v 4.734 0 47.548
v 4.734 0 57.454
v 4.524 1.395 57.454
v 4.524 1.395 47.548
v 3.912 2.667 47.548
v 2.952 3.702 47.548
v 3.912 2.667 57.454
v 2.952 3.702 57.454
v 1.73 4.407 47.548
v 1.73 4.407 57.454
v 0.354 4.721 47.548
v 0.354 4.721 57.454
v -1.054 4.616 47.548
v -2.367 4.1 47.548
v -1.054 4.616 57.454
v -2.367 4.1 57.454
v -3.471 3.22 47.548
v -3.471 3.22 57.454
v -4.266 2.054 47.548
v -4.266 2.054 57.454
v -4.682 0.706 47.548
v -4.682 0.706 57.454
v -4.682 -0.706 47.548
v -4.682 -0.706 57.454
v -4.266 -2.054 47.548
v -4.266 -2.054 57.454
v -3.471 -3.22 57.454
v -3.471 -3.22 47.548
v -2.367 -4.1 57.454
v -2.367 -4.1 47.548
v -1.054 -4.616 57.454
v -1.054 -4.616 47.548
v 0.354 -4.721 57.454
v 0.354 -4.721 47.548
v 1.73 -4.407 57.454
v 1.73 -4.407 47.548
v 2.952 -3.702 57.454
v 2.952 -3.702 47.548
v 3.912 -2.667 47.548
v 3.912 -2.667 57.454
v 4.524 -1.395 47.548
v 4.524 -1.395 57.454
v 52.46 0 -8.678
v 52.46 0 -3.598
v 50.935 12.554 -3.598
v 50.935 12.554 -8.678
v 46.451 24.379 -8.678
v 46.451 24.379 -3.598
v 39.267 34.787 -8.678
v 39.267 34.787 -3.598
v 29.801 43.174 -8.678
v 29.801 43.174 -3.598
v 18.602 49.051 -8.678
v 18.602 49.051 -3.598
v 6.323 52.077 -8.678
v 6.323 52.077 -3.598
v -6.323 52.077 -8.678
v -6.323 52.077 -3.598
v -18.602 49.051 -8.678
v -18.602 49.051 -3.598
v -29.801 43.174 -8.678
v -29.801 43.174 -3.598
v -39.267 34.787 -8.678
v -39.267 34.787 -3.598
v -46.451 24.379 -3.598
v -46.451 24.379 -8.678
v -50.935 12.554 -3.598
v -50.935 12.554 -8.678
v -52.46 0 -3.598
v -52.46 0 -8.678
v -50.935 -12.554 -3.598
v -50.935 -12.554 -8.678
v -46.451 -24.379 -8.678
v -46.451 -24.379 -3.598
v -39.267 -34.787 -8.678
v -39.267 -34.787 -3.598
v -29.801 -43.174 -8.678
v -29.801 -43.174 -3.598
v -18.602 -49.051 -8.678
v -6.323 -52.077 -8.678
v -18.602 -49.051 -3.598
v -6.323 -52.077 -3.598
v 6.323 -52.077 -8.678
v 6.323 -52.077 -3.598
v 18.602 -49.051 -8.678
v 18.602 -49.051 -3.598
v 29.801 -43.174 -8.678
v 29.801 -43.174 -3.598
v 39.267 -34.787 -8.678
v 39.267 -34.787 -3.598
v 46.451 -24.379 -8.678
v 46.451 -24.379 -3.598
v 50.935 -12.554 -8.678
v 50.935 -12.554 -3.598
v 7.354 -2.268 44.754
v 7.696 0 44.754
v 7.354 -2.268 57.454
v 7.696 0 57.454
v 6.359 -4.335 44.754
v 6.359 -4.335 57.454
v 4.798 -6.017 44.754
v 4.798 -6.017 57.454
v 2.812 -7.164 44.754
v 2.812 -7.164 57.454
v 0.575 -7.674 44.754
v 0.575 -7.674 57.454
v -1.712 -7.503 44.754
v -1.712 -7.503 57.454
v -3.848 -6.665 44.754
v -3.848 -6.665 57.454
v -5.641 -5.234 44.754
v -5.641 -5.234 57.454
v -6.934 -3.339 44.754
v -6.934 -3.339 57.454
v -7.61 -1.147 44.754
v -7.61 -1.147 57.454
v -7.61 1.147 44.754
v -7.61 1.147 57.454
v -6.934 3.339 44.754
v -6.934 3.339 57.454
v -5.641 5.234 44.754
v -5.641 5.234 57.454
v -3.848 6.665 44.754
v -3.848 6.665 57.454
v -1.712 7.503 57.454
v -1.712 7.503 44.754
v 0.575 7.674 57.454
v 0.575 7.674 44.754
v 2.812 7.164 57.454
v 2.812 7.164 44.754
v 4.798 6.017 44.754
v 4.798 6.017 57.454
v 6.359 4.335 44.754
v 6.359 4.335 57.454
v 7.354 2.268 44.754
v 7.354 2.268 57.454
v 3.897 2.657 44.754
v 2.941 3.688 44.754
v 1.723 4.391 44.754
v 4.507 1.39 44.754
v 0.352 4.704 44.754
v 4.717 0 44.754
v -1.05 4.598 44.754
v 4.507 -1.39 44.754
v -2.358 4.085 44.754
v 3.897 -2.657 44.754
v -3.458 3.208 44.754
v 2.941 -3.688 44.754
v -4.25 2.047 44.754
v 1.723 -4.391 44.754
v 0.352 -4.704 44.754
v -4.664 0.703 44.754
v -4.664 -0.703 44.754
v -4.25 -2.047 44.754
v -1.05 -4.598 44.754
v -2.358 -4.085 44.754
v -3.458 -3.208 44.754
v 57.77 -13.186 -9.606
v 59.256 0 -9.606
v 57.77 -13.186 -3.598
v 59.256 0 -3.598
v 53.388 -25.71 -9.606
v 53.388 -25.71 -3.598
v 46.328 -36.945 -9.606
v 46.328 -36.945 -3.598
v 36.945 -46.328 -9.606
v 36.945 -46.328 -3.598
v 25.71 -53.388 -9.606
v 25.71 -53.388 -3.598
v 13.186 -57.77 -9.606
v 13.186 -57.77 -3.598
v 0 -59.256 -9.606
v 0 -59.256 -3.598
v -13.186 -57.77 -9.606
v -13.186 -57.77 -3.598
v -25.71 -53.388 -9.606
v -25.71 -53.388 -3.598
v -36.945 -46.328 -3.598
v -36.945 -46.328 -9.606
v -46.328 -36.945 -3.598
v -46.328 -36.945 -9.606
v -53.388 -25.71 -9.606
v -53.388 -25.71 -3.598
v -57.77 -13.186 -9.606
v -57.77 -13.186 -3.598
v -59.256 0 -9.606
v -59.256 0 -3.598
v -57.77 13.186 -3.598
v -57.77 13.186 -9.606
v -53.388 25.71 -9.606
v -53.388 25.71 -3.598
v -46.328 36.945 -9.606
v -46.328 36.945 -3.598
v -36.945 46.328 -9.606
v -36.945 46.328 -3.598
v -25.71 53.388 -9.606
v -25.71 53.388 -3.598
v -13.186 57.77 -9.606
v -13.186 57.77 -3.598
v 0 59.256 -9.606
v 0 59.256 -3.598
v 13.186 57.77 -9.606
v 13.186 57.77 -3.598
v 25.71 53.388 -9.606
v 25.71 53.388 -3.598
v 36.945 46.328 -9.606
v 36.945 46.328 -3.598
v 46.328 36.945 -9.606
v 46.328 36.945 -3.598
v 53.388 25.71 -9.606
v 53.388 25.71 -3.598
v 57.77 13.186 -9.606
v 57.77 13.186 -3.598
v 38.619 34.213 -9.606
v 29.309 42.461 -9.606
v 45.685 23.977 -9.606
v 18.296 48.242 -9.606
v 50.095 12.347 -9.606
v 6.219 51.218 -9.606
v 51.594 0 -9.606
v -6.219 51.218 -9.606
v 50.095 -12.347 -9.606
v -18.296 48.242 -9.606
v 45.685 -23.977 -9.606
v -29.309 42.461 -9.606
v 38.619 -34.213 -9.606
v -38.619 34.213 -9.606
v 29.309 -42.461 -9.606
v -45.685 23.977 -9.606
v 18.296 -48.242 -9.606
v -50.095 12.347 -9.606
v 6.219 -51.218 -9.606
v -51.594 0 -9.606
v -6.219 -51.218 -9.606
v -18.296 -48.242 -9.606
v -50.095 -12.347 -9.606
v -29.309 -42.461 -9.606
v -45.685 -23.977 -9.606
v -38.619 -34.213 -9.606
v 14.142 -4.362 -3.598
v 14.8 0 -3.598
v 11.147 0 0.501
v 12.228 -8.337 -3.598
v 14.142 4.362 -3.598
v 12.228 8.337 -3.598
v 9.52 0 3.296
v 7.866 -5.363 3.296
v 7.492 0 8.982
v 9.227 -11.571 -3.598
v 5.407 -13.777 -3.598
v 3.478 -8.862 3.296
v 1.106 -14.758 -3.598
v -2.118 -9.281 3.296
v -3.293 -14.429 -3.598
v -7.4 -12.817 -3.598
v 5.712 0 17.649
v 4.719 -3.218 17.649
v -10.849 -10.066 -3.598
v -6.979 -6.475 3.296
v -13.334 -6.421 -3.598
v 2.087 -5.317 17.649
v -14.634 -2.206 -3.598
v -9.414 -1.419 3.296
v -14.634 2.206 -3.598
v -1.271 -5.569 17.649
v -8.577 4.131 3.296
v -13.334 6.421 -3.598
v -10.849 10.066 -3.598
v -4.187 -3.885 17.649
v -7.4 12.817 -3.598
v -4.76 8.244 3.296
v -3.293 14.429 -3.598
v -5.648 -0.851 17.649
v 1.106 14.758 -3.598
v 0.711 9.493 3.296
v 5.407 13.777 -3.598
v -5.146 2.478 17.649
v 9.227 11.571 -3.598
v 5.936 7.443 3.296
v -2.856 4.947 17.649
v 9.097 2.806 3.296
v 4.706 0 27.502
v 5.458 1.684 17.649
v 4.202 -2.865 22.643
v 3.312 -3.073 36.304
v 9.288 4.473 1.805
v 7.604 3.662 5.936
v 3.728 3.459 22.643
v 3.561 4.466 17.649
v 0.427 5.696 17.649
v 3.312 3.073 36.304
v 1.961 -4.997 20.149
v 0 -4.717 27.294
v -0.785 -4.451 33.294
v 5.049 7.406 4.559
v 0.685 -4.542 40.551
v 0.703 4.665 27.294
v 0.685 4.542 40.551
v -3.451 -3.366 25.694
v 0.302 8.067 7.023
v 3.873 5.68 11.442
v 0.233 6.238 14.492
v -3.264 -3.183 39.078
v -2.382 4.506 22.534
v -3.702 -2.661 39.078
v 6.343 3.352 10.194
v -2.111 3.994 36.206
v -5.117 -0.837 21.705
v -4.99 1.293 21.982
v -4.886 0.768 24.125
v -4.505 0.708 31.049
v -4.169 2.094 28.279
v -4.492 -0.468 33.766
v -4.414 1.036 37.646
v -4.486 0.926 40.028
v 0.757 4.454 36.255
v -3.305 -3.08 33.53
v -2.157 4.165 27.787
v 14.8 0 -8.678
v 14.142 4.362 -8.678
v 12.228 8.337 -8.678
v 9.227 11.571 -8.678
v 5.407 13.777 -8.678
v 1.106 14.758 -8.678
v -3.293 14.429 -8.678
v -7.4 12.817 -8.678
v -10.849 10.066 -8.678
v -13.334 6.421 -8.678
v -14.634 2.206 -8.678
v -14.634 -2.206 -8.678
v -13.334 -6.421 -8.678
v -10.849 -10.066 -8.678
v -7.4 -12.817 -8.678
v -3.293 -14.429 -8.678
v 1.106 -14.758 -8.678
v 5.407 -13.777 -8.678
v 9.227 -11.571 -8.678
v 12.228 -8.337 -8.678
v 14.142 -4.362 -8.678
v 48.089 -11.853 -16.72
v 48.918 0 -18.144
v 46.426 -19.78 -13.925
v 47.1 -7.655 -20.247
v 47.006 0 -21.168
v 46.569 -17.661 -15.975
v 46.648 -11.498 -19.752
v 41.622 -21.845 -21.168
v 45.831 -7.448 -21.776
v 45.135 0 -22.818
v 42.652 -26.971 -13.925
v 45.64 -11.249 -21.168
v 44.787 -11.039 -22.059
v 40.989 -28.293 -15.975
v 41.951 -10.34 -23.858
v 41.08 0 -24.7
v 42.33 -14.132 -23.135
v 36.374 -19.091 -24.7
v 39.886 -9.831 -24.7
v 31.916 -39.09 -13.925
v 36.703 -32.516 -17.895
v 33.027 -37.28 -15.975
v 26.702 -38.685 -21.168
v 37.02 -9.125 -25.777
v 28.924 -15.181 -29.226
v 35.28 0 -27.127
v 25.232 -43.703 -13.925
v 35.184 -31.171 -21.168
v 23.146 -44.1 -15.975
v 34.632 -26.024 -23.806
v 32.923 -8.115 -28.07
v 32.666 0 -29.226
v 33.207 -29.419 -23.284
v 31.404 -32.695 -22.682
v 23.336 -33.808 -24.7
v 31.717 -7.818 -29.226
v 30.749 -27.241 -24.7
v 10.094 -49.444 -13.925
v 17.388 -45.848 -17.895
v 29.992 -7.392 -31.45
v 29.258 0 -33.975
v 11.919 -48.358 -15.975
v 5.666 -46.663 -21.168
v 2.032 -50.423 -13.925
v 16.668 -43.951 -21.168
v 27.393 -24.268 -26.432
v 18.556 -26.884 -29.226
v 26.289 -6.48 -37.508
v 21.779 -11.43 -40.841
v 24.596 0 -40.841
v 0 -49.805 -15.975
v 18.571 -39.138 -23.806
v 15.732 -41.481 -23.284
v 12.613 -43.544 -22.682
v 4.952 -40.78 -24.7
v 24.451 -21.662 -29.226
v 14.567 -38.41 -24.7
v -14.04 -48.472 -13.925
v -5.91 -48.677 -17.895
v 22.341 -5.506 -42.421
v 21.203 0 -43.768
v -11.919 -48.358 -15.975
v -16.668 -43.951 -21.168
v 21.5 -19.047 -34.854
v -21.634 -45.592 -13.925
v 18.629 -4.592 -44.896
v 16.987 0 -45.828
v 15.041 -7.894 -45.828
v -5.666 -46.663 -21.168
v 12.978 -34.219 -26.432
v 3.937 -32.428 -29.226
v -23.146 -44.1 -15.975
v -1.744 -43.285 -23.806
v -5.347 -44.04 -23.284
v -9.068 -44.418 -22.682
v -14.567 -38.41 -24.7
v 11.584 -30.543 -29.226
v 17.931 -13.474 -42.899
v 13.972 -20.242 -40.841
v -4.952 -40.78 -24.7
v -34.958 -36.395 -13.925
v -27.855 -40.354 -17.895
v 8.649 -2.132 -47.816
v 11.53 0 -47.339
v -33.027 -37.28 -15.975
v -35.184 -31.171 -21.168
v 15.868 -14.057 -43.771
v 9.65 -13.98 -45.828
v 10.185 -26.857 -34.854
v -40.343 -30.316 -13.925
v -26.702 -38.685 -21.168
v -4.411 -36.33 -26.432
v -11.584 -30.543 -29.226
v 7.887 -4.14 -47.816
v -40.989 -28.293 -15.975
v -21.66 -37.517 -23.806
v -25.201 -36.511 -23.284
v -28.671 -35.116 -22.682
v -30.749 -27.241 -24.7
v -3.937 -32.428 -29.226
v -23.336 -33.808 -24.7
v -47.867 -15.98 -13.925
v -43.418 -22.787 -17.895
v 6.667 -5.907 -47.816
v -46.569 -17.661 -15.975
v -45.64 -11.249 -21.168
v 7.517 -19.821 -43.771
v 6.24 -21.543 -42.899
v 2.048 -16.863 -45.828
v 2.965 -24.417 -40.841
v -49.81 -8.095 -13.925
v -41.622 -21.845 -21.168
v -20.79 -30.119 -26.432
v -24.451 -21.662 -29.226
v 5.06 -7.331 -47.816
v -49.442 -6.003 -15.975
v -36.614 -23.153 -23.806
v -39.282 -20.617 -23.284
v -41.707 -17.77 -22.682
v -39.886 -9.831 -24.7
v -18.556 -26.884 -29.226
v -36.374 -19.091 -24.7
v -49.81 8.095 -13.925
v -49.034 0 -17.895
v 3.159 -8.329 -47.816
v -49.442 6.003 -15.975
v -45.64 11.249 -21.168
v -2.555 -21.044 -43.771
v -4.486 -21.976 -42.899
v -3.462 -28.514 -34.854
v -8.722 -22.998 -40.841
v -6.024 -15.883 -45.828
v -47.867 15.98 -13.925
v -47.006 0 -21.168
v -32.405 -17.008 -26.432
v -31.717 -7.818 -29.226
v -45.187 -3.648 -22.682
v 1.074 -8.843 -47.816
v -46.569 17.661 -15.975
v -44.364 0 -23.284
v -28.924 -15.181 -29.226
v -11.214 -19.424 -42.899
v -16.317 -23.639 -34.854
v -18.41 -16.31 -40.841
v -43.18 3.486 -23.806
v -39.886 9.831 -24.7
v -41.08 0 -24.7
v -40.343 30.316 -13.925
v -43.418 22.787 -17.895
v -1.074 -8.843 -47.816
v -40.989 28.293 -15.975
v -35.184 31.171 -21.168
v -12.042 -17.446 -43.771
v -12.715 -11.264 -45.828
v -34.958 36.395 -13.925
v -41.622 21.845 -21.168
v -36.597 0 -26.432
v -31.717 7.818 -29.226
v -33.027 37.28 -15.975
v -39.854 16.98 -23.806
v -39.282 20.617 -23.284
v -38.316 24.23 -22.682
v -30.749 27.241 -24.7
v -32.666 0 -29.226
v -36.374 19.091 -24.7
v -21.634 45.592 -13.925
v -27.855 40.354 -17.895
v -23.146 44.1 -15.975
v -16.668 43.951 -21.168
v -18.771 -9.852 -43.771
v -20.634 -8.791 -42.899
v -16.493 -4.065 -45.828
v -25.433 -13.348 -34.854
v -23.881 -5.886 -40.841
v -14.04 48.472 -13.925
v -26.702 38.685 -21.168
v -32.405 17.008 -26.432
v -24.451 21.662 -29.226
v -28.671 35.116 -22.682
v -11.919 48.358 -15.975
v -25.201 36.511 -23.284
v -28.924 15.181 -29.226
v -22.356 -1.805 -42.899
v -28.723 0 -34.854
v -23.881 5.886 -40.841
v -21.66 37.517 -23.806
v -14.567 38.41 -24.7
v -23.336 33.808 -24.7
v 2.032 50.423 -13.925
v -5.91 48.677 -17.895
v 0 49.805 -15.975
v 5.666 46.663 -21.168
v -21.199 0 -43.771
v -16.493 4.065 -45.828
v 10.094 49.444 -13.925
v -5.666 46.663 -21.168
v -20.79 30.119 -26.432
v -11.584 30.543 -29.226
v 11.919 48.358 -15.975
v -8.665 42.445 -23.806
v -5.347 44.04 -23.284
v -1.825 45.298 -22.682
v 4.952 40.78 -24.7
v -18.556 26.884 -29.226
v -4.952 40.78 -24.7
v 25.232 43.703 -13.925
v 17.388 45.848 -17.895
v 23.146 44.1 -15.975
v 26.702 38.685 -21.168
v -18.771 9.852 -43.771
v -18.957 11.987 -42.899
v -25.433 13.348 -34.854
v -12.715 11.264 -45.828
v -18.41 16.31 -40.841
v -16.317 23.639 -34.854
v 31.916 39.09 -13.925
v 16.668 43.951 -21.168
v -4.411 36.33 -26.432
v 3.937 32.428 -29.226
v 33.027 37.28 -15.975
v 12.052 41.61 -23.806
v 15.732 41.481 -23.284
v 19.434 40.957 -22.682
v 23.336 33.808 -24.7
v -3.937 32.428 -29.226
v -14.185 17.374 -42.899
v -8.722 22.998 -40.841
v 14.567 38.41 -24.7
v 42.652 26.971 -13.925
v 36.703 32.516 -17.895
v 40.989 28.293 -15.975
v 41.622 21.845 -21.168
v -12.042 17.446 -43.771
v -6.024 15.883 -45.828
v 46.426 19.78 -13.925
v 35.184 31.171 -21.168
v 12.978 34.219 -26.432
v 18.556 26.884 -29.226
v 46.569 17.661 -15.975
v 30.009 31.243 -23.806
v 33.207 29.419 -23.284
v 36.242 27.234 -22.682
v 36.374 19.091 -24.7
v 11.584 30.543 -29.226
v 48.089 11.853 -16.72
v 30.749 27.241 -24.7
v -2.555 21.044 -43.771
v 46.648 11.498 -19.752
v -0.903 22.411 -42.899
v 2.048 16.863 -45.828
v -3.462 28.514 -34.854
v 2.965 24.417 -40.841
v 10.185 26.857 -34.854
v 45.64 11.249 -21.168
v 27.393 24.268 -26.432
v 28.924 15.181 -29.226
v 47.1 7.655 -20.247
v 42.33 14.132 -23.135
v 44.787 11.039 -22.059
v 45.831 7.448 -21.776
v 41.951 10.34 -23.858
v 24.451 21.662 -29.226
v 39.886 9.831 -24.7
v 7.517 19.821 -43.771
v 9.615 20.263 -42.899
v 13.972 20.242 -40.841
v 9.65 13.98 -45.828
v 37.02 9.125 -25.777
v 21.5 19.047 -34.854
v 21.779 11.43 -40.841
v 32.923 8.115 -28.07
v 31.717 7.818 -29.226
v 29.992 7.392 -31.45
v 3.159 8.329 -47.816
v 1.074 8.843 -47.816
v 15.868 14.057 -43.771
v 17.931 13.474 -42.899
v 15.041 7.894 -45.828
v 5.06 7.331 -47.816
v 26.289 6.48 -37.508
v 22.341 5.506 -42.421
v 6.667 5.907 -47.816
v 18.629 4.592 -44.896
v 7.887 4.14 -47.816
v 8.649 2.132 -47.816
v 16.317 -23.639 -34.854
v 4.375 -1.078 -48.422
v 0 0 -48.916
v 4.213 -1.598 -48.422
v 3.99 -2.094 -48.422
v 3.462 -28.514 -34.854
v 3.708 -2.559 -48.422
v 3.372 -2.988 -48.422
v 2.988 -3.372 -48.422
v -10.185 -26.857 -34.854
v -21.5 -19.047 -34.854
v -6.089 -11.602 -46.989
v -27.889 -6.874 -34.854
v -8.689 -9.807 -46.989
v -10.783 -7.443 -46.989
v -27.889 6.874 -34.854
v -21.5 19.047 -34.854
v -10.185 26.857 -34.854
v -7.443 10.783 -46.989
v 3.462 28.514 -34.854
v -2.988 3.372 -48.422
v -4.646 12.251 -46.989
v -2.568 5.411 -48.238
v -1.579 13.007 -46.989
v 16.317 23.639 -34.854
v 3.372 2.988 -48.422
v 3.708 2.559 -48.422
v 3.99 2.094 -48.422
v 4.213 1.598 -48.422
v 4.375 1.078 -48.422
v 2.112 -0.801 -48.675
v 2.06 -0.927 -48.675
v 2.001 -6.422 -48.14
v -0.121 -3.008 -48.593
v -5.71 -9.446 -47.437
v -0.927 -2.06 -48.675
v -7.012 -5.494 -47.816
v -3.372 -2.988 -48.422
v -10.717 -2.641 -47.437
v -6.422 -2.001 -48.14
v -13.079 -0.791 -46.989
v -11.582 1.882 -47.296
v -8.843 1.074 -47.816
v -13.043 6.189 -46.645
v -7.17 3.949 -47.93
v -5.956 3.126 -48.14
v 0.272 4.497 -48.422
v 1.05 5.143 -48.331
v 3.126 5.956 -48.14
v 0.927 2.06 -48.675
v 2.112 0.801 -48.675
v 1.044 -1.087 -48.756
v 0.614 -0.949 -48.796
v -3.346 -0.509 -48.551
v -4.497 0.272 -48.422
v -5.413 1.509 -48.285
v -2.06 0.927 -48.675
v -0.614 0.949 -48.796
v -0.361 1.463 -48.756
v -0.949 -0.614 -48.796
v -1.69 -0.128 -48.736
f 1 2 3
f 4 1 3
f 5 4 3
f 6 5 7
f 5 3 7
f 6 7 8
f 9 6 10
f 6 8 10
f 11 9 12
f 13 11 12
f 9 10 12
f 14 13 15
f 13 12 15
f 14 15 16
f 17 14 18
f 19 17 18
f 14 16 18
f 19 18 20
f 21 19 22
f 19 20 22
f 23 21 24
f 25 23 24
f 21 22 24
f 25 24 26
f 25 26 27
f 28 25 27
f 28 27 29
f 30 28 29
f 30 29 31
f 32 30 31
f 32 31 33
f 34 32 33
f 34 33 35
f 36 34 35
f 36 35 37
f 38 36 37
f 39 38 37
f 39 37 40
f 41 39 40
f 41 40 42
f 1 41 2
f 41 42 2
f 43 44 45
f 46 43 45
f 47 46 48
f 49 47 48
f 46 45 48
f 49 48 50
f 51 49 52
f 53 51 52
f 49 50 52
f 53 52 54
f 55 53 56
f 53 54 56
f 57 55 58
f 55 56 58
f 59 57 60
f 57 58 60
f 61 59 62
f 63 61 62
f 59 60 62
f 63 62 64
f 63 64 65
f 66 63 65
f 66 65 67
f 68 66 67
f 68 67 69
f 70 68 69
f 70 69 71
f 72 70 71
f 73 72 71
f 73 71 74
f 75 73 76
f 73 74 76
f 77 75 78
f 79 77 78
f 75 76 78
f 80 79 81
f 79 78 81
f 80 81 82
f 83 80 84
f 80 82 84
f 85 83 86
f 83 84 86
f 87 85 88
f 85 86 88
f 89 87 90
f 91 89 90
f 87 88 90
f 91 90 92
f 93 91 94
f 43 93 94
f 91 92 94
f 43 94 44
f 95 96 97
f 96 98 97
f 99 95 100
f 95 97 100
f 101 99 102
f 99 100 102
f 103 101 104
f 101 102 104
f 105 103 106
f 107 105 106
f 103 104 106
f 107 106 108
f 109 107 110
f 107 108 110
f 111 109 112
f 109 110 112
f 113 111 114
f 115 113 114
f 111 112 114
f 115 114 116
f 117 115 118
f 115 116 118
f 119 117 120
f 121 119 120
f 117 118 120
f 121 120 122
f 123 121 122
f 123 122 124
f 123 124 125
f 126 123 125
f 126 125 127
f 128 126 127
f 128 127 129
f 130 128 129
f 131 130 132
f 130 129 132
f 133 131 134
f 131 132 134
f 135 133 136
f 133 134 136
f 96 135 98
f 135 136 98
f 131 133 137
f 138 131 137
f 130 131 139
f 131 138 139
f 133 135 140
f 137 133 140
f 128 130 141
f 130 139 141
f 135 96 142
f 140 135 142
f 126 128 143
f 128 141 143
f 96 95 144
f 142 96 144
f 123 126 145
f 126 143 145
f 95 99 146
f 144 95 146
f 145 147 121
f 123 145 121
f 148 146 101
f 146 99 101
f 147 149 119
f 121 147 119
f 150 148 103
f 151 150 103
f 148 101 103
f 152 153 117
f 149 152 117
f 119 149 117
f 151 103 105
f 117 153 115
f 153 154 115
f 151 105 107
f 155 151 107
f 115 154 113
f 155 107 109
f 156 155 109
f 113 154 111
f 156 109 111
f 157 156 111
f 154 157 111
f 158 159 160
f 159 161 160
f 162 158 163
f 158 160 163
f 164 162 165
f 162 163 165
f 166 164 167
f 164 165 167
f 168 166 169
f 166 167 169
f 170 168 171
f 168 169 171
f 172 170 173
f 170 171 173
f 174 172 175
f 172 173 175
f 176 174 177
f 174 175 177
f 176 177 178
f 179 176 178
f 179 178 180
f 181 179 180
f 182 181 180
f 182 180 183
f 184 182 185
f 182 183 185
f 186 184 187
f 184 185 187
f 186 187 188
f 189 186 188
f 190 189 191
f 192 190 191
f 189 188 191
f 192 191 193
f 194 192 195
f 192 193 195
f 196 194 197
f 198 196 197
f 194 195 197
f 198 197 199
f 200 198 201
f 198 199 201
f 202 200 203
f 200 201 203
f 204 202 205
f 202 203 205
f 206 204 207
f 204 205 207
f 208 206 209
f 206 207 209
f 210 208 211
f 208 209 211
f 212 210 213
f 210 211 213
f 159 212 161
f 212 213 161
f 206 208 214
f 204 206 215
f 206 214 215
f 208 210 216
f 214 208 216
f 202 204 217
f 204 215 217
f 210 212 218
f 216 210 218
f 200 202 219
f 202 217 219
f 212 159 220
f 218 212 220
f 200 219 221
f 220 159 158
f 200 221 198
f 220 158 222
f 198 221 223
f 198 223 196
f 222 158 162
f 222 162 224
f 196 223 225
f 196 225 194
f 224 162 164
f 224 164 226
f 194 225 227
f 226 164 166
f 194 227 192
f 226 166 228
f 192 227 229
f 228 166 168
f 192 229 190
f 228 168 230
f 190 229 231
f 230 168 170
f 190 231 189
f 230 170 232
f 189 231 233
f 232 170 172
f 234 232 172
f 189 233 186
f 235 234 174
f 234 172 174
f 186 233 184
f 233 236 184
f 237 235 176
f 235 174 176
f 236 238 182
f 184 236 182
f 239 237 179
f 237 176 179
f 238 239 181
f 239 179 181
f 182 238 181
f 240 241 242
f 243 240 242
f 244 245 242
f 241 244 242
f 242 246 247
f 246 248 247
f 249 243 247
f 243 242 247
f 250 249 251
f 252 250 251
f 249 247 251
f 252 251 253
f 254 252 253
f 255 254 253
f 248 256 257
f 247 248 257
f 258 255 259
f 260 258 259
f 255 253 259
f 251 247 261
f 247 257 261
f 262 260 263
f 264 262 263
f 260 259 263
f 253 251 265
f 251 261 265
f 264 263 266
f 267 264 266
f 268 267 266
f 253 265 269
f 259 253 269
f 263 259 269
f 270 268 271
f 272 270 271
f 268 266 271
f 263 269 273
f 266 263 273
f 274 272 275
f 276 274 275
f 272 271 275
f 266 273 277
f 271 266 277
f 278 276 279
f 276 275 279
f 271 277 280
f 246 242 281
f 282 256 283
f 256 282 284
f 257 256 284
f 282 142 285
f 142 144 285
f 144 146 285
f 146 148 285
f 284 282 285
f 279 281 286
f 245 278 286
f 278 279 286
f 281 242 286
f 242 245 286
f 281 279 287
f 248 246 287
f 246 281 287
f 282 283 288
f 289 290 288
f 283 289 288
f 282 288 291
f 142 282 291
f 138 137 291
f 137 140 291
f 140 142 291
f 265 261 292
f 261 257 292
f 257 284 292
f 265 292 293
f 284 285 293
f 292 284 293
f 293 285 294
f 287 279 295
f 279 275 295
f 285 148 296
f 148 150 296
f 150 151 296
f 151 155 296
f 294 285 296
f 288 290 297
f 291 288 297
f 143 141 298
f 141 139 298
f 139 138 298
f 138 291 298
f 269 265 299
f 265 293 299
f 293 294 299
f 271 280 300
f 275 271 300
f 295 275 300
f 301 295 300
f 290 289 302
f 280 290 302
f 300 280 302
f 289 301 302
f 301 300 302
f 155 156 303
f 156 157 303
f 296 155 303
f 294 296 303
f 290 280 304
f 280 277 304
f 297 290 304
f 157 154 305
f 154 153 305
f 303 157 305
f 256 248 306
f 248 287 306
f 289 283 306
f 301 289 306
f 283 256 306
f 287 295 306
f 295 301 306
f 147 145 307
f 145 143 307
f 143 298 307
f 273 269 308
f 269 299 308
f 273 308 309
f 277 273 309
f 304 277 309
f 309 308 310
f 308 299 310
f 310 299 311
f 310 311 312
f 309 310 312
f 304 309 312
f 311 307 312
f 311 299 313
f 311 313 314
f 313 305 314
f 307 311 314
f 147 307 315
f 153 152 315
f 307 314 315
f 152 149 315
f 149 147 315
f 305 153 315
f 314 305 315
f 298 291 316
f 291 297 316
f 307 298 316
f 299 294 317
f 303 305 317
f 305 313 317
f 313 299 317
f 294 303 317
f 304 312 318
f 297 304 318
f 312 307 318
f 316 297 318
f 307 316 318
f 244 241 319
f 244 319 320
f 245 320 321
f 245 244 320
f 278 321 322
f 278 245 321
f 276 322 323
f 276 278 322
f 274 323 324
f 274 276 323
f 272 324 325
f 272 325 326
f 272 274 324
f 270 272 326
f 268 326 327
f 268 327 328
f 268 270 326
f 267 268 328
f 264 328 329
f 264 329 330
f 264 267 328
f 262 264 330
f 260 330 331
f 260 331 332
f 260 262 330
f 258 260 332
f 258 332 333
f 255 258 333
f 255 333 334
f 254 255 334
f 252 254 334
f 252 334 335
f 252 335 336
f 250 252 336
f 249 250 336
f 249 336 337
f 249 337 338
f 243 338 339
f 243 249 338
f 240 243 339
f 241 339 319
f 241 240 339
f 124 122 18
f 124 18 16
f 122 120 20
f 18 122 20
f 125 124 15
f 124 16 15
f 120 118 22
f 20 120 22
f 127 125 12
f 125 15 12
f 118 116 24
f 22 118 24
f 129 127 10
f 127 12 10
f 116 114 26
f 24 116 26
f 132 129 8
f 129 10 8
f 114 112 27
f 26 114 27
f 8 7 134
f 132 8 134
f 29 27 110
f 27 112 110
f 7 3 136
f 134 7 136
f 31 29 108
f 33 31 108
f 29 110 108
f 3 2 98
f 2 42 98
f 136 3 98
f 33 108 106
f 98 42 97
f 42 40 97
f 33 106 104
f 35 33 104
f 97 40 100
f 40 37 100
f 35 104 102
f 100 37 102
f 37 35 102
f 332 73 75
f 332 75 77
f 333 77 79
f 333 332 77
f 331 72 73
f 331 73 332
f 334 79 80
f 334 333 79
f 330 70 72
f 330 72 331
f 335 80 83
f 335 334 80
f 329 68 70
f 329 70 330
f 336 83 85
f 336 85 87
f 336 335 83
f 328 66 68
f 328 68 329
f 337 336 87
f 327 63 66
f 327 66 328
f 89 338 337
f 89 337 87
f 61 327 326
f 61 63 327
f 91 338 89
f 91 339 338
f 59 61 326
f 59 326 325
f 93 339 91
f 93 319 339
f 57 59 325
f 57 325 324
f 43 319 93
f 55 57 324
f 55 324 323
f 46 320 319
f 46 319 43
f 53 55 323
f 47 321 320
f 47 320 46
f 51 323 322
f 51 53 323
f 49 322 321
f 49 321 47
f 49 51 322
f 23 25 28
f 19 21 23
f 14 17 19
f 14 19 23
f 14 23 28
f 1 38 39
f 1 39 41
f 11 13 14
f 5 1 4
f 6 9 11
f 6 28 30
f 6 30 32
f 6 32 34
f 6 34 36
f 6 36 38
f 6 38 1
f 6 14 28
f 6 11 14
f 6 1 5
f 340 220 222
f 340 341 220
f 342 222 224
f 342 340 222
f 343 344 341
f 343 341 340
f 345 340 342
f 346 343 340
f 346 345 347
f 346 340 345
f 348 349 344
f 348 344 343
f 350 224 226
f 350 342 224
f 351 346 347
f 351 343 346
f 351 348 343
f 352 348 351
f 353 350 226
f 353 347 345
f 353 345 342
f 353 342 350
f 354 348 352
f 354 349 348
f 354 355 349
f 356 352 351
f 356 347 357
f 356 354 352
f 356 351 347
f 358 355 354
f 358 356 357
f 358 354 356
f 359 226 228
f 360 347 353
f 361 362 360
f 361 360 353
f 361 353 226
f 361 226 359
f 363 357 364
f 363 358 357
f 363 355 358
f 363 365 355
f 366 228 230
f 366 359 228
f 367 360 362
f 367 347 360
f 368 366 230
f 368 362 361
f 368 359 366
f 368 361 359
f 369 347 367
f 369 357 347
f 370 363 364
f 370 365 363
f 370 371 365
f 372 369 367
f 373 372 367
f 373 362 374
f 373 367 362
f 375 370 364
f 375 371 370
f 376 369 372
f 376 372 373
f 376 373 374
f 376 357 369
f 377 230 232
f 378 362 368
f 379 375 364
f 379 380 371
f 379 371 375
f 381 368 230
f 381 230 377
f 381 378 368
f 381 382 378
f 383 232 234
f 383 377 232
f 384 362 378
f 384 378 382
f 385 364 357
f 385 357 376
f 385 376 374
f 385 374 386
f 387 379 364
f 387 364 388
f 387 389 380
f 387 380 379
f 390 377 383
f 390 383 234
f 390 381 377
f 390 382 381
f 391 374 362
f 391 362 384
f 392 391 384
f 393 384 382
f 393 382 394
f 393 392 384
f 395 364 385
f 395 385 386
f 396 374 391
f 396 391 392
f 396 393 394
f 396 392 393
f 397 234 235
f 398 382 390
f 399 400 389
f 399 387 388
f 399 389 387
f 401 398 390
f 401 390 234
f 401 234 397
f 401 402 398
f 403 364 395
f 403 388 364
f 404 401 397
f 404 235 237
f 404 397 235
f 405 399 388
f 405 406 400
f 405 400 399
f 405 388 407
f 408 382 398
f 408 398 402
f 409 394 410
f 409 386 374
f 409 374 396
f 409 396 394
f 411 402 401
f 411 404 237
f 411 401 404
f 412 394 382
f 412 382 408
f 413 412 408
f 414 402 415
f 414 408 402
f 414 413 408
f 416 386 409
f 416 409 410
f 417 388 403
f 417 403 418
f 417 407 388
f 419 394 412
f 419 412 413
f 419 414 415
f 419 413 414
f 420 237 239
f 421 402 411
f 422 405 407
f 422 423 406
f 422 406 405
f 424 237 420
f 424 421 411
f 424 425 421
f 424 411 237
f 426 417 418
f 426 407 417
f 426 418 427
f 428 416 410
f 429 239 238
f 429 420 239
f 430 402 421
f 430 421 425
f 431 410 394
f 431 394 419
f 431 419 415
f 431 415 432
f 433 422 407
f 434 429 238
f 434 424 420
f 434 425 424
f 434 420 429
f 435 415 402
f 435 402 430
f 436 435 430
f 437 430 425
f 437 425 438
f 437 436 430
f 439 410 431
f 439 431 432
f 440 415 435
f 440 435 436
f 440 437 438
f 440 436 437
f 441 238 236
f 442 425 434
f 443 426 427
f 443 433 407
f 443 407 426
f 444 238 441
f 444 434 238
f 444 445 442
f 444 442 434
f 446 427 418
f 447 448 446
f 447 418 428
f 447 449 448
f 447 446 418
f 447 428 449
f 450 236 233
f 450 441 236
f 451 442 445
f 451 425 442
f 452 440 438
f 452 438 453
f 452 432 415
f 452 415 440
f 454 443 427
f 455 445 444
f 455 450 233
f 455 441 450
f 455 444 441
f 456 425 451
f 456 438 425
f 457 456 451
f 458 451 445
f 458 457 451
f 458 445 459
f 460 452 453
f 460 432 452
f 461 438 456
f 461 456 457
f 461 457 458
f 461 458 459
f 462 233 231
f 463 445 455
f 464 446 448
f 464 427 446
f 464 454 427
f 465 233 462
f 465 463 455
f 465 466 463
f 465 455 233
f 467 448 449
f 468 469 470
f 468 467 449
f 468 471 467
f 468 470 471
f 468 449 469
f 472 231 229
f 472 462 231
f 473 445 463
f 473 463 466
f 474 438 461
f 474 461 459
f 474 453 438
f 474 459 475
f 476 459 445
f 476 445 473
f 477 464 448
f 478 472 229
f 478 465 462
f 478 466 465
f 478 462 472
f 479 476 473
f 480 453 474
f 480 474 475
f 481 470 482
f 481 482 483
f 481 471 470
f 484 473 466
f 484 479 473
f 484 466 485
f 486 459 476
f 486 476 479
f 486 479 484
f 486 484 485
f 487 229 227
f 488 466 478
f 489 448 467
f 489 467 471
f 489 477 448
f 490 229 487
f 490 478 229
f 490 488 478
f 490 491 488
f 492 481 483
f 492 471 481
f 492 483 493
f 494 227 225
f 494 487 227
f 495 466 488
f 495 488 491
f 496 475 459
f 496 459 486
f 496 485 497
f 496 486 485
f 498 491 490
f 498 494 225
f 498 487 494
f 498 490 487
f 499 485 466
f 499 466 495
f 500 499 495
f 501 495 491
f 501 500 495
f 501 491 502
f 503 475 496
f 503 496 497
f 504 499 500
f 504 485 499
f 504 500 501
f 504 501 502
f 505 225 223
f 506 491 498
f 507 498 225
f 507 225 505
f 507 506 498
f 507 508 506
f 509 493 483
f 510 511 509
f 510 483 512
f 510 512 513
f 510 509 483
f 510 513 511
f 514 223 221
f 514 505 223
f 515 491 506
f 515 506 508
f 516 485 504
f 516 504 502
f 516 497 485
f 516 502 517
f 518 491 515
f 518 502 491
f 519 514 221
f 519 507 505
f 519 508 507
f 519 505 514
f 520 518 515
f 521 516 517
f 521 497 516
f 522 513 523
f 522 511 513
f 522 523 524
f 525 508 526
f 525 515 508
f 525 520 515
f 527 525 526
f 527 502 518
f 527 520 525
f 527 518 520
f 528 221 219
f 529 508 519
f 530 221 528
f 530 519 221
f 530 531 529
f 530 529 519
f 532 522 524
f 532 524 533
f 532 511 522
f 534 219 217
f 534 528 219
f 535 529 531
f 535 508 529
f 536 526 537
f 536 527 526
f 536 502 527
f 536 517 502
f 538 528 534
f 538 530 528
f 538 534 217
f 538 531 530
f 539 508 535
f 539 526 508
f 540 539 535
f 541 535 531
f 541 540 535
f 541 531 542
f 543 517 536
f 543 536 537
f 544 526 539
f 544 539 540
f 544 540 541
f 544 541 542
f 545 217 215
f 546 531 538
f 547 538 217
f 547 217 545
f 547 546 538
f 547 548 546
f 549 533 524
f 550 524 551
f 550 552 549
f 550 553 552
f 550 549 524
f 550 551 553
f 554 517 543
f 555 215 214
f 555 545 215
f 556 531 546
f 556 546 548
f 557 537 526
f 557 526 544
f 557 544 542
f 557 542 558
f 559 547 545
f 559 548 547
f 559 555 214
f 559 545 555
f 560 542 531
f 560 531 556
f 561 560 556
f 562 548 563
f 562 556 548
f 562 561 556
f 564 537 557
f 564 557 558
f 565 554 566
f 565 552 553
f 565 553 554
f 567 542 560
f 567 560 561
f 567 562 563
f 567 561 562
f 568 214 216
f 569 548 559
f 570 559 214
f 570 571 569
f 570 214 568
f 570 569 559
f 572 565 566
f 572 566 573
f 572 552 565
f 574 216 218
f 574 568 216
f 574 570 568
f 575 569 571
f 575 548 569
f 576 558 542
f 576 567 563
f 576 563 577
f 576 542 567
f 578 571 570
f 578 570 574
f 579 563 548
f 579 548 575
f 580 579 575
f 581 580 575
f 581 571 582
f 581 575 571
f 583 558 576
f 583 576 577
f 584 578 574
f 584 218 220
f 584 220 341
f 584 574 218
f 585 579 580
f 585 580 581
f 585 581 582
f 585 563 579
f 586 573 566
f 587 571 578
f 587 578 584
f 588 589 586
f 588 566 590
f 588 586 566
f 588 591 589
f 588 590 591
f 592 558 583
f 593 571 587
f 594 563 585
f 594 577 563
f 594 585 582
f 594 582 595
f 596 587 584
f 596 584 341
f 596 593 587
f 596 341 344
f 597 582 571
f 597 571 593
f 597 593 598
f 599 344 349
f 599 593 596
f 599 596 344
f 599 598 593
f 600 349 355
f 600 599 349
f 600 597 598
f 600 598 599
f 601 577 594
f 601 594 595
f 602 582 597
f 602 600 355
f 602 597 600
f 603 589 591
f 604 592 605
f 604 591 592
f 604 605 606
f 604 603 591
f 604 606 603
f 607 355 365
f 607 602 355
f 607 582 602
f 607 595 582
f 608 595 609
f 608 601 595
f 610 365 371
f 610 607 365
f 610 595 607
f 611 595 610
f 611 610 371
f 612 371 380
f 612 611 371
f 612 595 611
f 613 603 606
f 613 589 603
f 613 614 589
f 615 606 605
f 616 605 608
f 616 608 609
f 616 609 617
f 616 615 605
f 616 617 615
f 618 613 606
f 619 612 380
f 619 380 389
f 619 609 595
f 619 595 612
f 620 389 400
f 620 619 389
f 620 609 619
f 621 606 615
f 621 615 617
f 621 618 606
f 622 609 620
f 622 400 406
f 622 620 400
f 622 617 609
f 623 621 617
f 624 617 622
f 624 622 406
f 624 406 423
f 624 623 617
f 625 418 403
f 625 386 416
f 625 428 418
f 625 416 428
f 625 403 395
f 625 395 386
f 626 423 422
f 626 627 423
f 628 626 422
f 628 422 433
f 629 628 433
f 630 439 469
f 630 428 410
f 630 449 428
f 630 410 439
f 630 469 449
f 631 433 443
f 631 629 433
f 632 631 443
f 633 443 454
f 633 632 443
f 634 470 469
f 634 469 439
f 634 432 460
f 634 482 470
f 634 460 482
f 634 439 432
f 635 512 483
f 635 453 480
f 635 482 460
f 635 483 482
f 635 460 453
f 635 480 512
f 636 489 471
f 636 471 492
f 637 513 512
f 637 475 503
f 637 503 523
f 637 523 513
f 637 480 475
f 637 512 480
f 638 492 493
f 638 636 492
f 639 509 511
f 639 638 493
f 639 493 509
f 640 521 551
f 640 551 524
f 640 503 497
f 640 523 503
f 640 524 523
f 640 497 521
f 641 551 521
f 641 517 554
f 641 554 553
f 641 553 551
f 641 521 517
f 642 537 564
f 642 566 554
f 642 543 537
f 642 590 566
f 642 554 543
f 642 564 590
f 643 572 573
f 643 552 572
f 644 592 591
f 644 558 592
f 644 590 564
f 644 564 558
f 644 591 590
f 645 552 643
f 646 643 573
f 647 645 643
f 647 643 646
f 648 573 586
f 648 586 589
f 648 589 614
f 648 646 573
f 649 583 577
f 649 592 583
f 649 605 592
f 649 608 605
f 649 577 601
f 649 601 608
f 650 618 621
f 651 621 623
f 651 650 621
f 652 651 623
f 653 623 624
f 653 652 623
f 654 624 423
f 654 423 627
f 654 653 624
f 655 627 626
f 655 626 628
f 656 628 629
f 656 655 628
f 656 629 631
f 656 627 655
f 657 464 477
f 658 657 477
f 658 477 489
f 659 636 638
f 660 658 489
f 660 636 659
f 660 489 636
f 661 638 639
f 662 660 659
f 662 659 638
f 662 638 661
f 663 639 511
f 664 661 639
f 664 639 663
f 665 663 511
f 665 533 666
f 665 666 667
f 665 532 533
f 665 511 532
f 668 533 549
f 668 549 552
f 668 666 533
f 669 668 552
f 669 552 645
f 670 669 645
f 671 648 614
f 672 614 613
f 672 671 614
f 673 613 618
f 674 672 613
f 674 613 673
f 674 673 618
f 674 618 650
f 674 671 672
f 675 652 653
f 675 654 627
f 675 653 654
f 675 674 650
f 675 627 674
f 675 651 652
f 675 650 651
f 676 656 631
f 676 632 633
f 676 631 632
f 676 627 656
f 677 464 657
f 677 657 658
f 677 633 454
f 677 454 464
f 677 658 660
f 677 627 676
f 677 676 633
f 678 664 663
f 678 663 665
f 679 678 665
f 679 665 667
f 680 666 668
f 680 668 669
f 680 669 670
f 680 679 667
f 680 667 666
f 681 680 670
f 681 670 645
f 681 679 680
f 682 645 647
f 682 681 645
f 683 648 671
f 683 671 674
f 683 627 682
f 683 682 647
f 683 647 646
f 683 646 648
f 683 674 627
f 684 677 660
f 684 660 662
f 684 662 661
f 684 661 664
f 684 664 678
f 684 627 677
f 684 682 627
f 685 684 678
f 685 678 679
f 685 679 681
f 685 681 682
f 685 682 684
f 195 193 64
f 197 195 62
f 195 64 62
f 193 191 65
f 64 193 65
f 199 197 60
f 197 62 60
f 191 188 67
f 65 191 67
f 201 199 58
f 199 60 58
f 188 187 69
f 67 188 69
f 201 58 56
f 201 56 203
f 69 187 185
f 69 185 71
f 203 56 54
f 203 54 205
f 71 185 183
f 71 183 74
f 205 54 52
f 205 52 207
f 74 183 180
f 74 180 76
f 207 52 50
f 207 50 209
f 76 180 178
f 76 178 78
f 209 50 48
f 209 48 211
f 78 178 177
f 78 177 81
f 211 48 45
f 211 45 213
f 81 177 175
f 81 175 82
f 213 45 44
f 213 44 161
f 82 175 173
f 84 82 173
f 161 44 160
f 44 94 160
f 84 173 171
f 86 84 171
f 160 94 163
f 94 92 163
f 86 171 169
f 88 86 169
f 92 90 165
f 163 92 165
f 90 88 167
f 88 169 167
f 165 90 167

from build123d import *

# Parameters (mm, degrees)
F2_R     = 52.4597780646
F2_R_2   = 14.7995962225
F3_DEPTH = 5.08
F4_R     = 4.734417081
F5_DEPTH = 9.906


with BuildPart() as f1:
    # F0 (on Front) → F1 (revolve)
    with BuildSketch(Plane.XZ):
        with BuildLine():
            Line((51.5943290595, -9.6055062943), (56.3692913846, -9.6055062943))
            Line((56.3692913846, -9.6055062943), (59.2558380857, -9.6055062943))
            Line((59.2558380857, -9.6055062943), (59.2558380857, -3.5977592756))
            Line((59.2558380857, -3.5977592756), (14.7995962225, -3.5977592756))
            add(Edge.make_bspline(
                [(14.7995962225, -3.5977592756), (12.9266153868, -1.754985324), (8.1131582041, 2.9808420721), (4.0918168267, 24.7912842254), (4.5096354849, 38.1383005567), (4.7167390869, 44.7541268357)],
                knots=[0, 0, 0, 0, 0.2431325449, 0.6248372392, 1, 1, 1, 1], degree=3))
            Line((4.7167390869, 44.7541268357), (7.6957641878, 44.7541268357))
            Line((7.6957641878, 44.7541268357), (7.6957641878, 57.4541268357))
            Line((7.6957641878, 57.4541268357), (0, 57.4541268357))
            Line((0, 57.4541268357), (0, -48.9155651629))
            add(Edge.make_bspline(
                [(51.5943290595, -9.6055062943), (50.351203821, -14.641850477), (47.8964006913, -24.587135526), (31.4519415034, -25.5645820307), (25.3670083123, -46.2486306462), (8.8589921776, -47.9841840626), (0, -48.9155651629)],
                knots=[0, 0, 0, 0, 0.2264260994, 0.4471243373, 0.7033004364, 1, 1, 1, 1], degree=3))
        make_face()
    revolve(axis=Axis((0, 0, 4.2692808364), (0, 0, -1)))

    # F2 (on face) → F3 (cut)
    with BuildSketch(Plane.XY.offset(-3.5977592756)):
        Circle(F2_R)
        Circle(F2_R_2, mode=Mode.SUBTRACT)
    extrude(amount=-F3_DEPTH, mode=Mode.SUBTRACT)

    # F4 (on face) → F5 (cut)
    with BuildSketch(Plane.XY.offset(57.4541268357)):
        Circle(F4_R)
    extrude(amount=-F5_DEPTH, mode=Mode.SUBTRACT)


solid = f1.part
